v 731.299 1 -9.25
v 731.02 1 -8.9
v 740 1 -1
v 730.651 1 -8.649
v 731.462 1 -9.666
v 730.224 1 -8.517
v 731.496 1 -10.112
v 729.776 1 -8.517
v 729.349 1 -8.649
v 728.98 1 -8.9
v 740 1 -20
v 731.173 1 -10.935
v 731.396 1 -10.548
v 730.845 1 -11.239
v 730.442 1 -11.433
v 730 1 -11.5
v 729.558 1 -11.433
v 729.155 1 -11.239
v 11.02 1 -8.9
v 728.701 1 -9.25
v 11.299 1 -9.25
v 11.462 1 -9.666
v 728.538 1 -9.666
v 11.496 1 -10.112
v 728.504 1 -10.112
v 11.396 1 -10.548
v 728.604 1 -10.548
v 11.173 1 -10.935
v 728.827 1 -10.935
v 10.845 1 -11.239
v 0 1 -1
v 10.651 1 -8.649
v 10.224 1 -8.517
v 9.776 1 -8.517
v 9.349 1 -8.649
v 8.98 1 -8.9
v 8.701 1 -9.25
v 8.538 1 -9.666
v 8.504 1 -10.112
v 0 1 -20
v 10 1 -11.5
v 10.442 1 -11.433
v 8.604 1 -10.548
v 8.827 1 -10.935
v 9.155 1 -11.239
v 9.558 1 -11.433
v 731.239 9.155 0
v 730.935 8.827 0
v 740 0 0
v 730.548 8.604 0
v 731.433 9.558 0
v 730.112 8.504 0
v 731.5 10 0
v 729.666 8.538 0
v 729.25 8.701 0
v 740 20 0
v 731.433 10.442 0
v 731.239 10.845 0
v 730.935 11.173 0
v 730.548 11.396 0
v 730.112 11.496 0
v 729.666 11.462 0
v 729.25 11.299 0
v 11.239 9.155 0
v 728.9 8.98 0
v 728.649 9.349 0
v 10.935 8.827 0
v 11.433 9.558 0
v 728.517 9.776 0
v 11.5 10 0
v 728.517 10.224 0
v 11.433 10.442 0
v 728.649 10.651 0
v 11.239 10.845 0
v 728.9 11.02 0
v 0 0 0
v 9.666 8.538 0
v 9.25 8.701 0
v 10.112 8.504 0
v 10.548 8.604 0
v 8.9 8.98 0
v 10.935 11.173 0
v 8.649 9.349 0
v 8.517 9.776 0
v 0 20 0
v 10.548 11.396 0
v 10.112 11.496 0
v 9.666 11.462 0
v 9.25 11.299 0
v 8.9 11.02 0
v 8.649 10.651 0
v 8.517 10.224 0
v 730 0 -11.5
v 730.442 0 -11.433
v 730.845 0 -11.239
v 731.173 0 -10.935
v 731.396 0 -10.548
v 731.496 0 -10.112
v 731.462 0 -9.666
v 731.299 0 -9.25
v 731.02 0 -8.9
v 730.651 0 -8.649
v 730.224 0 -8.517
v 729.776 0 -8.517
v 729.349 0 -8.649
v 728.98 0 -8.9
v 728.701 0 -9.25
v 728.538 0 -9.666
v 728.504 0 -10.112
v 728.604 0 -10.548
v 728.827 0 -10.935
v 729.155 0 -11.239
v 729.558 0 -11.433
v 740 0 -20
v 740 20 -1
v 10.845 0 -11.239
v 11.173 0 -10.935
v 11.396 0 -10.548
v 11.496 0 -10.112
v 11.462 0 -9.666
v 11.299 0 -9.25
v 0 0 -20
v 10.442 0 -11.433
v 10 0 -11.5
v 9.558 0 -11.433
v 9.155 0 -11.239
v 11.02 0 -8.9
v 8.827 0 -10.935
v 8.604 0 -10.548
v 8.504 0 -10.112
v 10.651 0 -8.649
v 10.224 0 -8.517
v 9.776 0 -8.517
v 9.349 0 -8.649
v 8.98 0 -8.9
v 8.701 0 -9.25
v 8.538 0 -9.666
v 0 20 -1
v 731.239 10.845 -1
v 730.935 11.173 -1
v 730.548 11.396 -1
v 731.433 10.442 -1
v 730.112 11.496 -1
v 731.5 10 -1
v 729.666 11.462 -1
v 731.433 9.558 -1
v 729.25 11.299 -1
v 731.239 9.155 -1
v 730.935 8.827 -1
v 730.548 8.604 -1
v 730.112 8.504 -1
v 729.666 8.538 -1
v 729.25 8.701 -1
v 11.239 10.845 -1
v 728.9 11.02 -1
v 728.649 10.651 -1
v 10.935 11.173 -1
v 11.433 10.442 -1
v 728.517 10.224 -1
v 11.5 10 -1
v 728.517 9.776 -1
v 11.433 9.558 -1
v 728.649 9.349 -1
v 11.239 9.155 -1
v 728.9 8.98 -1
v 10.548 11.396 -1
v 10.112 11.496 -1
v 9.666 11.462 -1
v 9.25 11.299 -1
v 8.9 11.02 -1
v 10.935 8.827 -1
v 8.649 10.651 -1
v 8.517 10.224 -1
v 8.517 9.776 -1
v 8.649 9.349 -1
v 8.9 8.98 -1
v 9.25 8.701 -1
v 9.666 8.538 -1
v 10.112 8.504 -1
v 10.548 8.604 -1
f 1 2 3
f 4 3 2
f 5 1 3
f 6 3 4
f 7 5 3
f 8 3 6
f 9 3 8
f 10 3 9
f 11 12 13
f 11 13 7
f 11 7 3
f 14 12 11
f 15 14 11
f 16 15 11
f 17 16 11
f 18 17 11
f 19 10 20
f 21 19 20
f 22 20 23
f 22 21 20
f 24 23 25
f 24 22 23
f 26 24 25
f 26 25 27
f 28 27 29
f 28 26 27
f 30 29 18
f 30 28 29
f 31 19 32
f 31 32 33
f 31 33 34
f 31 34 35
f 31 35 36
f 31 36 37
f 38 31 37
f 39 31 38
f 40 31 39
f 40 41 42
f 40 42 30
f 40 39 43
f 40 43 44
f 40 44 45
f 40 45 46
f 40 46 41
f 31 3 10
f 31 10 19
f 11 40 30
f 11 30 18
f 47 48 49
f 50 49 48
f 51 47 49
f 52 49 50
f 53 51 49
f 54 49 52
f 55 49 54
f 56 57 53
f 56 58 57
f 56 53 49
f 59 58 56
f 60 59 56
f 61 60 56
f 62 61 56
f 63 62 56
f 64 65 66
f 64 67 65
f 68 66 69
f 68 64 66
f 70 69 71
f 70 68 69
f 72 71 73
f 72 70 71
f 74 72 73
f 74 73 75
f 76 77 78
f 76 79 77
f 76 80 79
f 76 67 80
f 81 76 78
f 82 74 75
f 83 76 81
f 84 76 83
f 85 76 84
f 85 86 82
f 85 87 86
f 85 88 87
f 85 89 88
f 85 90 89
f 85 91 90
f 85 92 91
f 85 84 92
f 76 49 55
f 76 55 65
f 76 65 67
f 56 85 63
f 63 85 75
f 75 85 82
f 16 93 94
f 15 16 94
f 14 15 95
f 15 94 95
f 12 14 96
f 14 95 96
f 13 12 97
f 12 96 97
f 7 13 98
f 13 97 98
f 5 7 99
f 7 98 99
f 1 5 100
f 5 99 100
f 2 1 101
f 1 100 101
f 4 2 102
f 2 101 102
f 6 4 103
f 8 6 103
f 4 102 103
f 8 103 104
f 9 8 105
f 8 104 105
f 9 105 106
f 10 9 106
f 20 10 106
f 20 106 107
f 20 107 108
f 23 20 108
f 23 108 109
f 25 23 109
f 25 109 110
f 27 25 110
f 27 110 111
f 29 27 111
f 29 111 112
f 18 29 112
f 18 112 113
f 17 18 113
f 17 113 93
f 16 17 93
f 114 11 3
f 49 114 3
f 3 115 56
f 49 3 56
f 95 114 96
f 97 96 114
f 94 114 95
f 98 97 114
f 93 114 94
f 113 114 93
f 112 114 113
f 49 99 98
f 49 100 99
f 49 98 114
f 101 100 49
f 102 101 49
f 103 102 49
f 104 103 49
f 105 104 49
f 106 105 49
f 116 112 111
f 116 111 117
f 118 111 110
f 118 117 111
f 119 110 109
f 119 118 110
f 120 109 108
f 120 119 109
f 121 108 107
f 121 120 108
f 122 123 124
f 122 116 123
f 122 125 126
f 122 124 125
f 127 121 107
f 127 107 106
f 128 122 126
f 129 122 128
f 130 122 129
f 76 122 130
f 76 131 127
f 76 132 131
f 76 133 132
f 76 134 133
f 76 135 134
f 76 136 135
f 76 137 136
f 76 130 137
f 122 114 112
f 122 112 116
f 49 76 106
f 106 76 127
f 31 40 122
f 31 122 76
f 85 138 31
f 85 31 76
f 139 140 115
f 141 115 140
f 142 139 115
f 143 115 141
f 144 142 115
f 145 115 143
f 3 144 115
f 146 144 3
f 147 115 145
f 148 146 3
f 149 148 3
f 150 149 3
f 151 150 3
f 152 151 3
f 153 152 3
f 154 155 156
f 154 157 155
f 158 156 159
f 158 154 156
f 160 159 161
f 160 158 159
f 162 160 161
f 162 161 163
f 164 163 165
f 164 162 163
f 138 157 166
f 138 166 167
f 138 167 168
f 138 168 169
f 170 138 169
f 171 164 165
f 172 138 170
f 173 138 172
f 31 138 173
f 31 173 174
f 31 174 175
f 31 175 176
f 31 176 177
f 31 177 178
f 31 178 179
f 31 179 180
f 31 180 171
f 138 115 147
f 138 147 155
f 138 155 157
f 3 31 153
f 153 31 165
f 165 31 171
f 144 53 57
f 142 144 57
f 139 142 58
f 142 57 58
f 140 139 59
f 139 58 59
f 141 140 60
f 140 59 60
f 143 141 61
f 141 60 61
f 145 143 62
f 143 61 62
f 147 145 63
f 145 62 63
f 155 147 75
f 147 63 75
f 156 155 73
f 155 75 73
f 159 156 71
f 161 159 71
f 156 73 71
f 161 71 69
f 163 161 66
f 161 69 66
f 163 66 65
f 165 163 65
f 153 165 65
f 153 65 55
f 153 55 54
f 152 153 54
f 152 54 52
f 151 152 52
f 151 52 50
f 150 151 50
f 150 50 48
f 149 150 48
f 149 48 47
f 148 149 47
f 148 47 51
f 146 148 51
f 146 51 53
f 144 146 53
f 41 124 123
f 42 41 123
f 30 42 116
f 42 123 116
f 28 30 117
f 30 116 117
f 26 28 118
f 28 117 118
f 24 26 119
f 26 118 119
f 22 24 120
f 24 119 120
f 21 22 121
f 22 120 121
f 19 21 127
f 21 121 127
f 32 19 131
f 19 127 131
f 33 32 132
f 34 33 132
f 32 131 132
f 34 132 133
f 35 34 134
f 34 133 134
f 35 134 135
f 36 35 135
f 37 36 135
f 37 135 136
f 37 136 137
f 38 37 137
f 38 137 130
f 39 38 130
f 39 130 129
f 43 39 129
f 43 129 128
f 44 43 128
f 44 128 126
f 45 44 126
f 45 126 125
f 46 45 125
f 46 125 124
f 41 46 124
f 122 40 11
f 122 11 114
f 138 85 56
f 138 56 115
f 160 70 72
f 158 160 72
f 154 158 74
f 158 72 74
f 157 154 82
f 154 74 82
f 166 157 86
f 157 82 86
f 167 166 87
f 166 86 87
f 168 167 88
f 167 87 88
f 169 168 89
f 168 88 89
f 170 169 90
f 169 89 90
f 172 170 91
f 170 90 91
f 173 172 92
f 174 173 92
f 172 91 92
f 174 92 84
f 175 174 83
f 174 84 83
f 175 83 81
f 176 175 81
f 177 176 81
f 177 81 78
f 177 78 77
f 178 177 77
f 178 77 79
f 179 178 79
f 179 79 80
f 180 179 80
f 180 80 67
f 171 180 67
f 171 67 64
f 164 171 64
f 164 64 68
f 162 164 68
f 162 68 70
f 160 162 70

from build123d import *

# Parameters (mm, degrees)
BOSS_EXTRUDE1_DEPTH = 740
CUT_EXTRUDE1_REACH  = 742.54
SKETCH2_R           = 1.5
CUT_EXTRUDE2_REACH  = 742.54
SKETCH3_R           = 1.5


with BuildPart() as part:
    # Sketch1 → Boss-Extrude1 (new body)
    with BuildSketch(Plane(origin=(0, 0, 0), x_dir=(0, 0, -1), z_dir=(1, 0, 0))):
        Polygon((0, 0), (0, 20), (1, 20), (1, 1), (20, 1), (20, 0), align=None)
    extrude(amount=BOSS_EXTRUDE1_DEPTH)

    # Sketch2 → Cut-Extrude1 (cut, up to next)
    with BuildSketch(Plane.XY, mode=Mode.PRIVATE) as cut_extrude1_sk1:
        with Locations((10, 10)):
            Circle(SKETCH2_R)
    cut_extrude1_tool1 = extrude(cut_extrude1_sk1.sketch, amount=-CUT_EXTRUDE1_REACH, mode=Mode.PRIVATE) & part.part
    # Sketch2 → Cut-Extrude1 (cut, up to next)
    with BuildSketch(Plane.XY, mode=Mode.PRIVATE) as cut_extrude1_sk2:
        with Locations((730, 10)):
            Circle(SKETCH2_R)
    cut_extrude1_tool2 = extrude(cut_extrude1_sk2.sketch, amount=-CUT_EXTRUDE1_REACH, mode=Mode.PRIVATE) & part.part
    add(cut_extrude1_tool1.solids().sort_by_distance((10, 10, 0))[0], mode=Mode.SUBTRACT)
    add(cut_extrude1_tool2.solids().sort_by_distance((730, 10, 0))[0], mode=Mode.SUBTRACT)

    # Sketch3 → Cut-Extrude2 (cut, up to next)
    with BuildSketch(Plane.XZ, mode=Mode.PRIVATE) as cut_extrude2_sk1:
        with Locations(Location((10, -10, 0), (0, 0, 270))):
            Circle(SKETCH3_R)
    cut_extrude2_tool1 = extrude(cut_extrude2_sk1.sketch, amount=-CUT_EXTRUDE2_REACH, mode=Mode.PRIVATE) & part.part
    # Sketch3 → Cut-Extrude2 (cut, up to next)
    with BuildSketch(Plane.XZ, mode=Mode.PRIVATE) as cut_extrude2_sk2:
        with Locations(Location((730, -10, 0), (0, 0, 270))):
            Circle(SKETCH3_R)
    cut_extrude2_tool2 = extrude(cut_extrude2_sk2.sketch, amount=-CUT_EXTRUDE2_REACH, mode=Mode.PRIVATE) & part.part
    add(cut_extrude2_tool1.solids().sort_by_distance((10, 0, -10))[0], mode=Mode.SUBTRACT)
    add(cut_extrude2_tool2.solids().sort_by_distance((730, 0, -10))[0], mode=Mode.SUBTRACT)


solid = part.part
